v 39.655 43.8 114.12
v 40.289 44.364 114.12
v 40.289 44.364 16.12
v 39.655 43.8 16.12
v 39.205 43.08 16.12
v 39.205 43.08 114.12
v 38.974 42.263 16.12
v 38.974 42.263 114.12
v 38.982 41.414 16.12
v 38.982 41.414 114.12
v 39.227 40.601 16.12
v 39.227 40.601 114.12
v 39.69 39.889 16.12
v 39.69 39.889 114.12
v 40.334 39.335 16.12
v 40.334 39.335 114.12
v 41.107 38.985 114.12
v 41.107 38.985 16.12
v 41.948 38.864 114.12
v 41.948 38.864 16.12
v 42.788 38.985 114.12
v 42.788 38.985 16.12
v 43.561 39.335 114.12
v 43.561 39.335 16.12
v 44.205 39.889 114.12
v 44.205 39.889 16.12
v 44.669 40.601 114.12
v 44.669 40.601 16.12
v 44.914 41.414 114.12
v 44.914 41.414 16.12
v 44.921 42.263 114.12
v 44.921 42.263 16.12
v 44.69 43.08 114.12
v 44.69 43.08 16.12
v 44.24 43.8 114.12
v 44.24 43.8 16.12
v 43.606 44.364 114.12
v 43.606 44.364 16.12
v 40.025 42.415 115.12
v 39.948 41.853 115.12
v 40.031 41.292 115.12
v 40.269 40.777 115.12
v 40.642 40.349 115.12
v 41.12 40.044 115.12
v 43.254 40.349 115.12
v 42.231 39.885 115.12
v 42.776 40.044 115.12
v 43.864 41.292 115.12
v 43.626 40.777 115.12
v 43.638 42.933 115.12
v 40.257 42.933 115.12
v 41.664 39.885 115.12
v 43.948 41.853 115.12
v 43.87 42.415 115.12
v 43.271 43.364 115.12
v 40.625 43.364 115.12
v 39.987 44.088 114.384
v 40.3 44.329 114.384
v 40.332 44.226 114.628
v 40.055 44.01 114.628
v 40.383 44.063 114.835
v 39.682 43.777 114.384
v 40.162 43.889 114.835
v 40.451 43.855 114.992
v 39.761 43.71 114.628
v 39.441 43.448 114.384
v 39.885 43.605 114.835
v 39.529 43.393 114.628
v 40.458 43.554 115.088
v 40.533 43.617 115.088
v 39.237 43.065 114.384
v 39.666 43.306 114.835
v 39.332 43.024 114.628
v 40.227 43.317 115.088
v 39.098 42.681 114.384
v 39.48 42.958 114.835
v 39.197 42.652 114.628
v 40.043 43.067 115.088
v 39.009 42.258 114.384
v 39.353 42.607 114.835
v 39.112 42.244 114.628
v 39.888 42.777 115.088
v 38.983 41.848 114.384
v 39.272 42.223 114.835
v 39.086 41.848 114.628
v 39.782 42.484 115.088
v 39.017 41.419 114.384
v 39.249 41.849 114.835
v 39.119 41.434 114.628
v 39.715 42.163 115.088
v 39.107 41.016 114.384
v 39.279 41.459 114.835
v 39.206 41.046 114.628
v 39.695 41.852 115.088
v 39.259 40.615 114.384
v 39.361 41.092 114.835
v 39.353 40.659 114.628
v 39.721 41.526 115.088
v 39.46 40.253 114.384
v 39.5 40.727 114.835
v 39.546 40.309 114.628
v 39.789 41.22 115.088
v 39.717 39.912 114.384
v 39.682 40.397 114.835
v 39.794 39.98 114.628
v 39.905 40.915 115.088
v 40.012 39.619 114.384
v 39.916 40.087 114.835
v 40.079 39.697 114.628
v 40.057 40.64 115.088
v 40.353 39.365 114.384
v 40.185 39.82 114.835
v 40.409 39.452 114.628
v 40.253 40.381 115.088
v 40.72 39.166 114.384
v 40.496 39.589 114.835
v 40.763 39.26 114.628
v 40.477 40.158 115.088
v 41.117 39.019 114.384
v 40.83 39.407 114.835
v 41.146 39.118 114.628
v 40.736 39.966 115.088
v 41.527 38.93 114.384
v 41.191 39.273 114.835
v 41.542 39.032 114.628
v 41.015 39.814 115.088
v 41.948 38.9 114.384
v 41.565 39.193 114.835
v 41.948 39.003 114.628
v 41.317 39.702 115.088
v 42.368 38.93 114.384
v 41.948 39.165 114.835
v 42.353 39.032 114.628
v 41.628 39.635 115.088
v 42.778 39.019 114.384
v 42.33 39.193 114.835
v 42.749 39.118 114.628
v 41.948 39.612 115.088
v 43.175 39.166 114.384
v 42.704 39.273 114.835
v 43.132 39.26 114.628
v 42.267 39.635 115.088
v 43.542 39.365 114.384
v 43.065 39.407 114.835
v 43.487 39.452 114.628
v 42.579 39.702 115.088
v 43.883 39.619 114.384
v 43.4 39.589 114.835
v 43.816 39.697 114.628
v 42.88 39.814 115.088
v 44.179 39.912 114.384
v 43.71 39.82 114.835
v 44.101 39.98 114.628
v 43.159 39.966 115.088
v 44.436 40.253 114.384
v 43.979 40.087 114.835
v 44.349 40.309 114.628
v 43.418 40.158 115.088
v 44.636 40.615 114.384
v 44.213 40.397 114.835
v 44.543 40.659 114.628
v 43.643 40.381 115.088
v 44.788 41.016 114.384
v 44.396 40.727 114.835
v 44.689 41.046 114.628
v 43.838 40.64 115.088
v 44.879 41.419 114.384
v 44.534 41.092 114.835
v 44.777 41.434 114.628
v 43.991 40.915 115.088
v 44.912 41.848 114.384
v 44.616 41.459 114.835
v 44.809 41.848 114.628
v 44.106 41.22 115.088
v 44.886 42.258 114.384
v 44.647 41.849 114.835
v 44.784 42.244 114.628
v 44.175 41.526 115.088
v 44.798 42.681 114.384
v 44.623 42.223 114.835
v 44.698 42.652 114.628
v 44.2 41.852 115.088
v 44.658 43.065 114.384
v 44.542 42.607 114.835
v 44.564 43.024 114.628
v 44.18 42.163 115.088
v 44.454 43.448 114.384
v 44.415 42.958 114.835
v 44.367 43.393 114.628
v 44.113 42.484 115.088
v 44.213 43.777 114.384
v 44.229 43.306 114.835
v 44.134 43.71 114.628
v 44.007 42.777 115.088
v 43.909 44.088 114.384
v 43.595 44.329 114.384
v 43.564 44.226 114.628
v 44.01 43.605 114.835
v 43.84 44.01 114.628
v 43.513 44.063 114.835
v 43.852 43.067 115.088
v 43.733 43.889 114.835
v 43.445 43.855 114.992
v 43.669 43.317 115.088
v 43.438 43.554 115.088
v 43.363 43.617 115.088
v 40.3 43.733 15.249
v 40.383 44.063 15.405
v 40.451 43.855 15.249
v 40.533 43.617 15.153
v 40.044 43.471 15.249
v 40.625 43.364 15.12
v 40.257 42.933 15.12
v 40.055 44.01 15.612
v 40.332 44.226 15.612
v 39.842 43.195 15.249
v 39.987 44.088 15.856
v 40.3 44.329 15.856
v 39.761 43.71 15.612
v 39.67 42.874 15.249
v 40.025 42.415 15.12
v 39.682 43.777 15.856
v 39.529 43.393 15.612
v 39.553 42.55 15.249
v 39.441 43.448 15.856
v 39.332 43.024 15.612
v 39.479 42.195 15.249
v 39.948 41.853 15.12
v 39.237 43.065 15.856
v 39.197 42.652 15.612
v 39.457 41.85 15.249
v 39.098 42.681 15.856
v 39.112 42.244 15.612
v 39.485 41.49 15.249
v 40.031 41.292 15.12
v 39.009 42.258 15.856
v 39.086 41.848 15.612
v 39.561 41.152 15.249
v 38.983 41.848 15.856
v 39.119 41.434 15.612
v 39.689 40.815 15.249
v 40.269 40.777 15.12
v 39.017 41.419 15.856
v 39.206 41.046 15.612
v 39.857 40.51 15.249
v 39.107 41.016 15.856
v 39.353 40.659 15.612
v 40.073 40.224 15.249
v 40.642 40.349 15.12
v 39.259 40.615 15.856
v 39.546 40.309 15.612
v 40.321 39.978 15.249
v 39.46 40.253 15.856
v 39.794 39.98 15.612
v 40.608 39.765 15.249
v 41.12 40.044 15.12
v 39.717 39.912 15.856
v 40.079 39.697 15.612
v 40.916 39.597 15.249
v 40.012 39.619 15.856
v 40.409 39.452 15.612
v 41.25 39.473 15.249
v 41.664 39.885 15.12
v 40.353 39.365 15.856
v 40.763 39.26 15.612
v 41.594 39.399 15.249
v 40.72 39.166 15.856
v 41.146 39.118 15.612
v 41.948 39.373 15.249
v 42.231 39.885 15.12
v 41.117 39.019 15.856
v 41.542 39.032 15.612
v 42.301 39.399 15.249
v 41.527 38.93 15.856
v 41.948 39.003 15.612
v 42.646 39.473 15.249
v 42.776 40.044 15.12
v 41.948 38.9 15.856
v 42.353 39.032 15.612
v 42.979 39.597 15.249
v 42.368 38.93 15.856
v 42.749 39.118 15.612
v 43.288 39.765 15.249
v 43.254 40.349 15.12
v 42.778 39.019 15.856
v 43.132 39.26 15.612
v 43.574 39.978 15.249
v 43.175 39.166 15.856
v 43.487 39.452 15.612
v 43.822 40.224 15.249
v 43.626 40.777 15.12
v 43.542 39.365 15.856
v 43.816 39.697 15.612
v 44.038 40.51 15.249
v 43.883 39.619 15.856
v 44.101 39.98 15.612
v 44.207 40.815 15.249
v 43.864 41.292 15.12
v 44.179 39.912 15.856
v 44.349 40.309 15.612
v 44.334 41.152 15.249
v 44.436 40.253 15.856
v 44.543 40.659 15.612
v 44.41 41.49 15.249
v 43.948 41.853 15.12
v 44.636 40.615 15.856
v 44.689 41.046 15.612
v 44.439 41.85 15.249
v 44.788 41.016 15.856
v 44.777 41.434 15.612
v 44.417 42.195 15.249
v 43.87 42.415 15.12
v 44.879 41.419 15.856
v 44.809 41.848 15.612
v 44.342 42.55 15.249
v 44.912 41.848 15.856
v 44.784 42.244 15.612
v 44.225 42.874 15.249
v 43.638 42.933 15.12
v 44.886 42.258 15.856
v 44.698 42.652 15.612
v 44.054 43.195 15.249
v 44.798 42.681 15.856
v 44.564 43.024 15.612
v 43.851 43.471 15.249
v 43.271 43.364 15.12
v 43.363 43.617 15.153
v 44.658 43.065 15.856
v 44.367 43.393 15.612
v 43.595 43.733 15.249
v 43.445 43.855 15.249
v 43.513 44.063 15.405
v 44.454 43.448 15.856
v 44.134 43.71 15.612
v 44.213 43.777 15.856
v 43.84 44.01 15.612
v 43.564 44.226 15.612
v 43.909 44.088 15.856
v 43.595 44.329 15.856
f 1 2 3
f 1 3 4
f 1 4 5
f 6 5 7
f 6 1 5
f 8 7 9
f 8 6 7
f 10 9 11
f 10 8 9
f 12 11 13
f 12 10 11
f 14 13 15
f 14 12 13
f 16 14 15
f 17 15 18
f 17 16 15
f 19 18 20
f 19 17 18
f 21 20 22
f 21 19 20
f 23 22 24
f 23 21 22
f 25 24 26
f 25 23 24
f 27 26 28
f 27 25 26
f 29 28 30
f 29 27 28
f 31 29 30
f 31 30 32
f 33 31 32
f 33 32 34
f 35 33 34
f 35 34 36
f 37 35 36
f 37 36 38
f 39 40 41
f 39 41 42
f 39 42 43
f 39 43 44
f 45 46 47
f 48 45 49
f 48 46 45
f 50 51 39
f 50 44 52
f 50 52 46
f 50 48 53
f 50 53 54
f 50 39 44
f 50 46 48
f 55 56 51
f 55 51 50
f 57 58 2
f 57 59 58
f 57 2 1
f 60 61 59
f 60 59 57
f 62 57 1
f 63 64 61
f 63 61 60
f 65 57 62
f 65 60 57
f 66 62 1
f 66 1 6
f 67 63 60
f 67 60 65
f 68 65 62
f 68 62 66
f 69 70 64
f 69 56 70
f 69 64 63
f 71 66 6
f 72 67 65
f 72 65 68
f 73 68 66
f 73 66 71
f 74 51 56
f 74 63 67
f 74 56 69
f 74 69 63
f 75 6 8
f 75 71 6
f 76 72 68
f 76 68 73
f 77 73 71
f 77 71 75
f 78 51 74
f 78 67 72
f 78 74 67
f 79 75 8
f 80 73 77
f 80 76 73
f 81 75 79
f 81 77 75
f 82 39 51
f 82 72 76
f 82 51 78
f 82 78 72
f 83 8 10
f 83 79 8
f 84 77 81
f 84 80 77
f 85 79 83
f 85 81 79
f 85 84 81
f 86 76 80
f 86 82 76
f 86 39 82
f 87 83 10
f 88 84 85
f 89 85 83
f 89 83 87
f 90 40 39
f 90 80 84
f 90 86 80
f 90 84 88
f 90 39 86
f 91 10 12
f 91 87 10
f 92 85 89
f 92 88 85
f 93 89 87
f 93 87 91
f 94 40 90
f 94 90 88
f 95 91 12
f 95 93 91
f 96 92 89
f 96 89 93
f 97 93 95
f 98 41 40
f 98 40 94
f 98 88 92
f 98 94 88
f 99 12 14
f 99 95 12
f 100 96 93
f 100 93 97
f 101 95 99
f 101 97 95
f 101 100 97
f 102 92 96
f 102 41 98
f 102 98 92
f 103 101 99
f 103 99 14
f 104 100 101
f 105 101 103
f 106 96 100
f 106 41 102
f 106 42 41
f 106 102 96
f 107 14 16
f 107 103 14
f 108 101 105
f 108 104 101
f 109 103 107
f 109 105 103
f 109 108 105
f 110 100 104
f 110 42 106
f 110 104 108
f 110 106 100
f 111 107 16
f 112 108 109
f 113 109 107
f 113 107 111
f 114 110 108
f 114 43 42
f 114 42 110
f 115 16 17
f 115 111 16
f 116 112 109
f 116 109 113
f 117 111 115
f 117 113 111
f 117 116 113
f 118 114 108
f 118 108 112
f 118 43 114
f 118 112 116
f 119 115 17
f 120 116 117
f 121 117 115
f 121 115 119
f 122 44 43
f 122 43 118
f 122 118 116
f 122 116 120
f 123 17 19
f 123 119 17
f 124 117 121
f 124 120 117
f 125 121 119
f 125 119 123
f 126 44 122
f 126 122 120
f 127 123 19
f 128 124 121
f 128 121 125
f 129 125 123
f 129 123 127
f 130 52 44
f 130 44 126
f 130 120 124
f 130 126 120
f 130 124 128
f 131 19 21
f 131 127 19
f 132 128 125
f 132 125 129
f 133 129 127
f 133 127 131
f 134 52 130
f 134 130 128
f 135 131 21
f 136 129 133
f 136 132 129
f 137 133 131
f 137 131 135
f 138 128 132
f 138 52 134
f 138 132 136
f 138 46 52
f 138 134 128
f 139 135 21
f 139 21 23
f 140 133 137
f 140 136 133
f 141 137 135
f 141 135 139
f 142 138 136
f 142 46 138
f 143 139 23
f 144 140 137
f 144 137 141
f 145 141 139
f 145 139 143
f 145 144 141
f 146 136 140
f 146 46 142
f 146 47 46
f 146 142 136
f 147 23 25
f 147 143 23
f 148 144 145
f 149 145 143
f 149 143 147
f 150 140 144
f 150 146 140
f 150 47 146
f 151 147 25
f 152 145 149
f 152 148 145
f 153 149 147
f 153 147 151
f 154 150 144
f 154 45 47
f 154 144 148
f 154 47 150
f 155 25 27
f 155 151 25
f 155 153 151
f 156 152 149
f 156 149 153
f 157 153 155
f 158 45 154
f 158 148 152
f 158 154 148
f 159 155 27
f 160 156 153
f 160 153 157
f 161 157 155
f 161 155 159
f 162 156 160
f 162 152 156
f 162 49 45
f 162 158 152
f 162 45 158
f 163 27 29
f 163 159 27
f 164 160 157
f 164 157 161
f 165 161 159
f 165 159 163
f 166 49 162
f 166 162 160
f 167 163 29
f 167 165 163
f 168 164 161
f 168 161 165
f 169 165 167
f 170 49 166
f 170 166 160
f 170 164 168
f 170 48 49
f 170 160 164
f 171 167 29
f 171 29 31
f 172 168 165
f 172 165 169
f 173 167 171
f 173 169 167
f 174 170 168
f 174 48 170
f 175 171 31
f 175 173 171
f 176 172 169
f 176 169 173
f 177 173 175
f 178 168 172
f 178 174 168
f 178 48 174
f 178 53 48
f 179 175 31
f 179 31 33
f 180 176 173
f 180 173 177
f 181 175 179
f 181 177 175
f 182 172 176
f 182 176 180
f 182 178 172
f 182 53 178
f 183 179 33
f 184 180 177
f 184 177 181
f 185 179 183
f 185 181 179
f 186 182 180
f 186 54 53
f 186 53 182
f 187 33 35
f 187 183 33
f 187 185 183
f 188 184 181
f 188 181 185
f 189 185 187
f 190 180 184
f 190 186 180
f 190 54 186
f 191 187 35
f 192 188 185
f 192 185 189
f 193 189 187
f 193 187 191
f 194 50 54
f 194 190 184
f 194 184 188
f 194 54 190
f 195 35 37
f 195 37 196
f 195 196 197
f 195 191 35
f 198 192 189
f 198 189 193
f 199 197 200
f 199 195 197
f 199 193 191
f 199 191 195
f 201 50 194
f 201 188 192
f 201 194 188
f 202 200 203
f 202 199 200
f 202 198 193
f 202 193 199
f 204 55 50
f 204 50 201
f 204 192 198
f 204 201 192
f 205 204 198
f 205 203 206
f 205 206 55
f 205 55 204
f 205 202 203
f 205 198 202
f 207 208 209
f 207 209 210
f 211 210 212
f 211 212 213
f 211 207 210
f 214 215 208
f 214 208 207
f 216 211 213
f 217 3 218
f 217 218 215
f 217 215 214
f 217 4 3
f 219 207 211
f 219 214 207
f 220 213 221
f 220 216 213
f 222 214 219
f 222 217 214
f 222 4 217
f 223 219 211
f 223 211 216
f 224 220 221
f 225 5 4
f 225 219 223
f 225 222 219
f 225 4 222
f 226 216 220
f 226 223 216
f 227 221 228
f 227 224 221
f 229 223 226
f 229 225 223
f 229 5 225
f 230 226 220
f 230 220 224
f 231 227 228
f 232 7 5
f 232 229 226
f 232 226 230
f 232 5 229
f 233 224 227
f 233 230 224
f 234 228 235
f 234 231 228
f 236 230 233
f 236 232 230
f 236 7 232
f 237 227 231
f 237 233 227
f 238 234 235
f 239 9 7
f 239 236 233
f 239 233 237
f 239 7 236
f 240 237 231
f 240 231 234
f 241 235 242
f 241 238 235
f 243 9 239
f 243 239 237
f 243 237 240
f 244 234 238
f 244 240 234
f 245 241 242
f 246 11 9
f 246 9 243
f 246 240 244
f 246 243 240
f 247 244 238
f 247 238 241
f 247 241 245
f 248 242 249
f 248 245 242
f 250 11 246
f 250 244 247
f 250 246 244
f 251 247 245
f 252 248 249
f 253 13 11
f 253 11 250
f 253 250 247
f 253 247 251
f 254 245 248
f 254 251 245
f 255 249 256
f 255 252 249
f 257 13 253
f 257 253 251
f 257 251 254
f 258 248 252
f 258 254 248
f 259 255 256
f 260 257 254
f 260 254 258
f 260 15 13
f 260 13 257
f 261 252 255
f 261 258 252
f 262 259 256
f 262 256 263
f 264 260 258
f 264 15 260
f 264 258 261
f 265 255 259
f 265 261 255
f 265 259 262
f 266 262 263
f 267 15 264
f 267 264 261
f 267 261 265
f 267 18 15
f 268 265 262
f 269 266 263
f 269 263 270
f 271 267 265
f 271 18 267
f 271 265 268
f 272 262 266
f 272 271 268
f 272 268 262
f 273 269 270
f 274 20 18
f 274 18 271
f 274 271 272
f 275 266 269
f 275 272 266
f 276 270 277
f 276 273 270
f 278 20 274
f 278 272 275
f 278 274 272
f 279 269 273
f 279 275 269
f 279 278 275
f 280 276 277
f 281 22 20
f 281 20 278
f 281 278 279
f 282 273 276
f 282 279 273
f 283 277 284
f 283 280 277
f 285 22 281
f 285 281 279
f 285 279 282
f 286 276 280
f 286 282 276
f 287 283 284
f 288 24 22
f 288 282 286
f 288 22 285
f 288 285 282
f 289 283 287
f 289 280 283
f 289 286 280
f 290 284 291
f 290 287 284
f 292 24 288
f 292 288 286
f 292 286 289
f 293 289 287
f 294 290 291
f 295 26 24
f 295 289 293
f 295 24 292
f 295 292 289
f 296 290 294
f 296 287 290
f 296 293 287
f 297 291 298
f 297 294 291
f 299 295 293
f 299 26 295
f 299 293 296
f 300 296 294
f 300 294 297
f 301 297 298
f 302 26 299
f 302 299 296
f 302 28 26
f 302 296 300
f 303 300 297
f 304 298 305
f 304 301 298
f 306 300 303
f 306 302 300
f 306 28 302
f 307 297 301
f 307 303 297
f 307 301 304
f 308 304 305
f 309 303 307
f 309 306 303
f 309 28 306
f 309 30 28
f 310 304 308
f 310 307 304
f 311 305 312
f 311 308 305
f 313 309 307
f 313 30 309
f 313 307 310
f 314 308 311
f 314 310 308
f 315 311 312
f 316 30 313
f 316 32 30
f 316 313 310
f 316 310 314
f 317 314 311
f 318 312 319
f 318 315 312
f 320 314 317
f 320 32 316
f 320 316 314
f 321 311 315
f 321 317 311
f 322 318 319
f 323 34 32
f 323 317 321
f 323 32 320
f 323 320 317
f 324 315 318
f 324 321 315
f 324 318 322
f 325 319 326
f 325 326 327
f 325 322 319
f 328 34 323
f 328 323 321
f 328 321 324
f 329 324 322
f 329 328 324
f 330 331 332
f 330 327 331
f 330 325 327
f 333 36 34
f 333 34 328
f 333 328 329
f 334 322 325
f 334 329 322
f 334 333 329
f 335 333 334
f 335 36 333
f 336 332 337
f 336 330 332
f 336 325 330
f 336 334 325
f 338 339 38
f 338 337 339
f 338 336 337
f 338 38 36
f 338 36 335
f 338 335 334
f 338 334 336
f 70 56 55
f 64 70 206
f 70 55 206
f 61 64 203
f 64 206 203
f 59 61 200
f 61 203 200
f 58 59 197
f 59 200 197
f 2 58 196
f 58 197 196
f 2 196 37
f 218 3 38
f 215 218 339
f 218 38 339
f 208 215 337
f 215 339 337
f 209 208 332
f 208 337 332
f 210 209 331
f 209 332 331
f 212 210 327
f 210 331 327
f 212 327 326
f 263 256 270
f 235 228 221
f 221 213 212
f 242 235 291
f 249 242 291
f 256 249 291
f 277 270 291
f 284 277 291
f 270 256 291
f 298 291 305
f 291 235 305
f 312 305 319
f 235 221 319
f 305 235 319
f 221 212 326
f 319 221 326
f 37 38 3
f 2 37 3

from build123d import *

# Parameters (mm, degrees)
BOSS_EXTRUDE1_DEPTH = 100
FILLET1_R           = 1


with BuildPart() as part:
    # Sketch1 → Boss-Extrude1 (new body)
    with BuildSketch(Plane.XY.offset(115.120373728)):
        with BuildLine():
            Line((43.606003854, 44.364343494), (40.289379064, 44.364343494))
            ThreePointArc((40.289379064, 44.364343494), (41.947691459, 38.864343494), (43.606003854, 44.364343494))
        make_face()
    extrude(amount=-BOSS_EXTRUDE1_DEPTH)

    # Fillet1
    # the kernel refuses this fillet: 1 mm, written as the material it takes off along each edge
    with BuildSketch(Plane(origin=(46.106003854, 44.364343494, 115.120373728), x_dir=(0, 0, -1), z_dir=(-1, 0, 0))) as fillet1_piece_1:
        with BuildLine():
            CenterArc((FILLET1_R, FILLET1_R), FILLET1_R, 180, 90)
            Line((0, FILLET1_R), (0, 0))
            Line((0, 0), (FILLET1_R, 0))
        make_face()
    extrude(amount=8.31662479, mode=Mode.SUBTRACT)
    with BuildSketch(Plane(origin=(41.947691459, 41.864343494, 115.120373728), x_dir=(-0.0031415874858803736, 0.9999950652018582, 0), z_dir=(0.9999950652018582, 0.0031415874858803736, 0))) as fillet1_piece_2:
        with BuildLine():
            CenterArc((3 - FILLET1_R, -FILLET1_R), FILLET1_R, 0, 90)
            Line((3 - FILLET1_R, 0), (3, 0))
            Line((3, 0), (3, -FILLET1_R))
        make_face()
    revolve(axis=Axis((41.947691459, 41.864343494, 115.120373728), (0, 0, 1)), revolution_arc=359.64, mode=Mode.SUBTRACT)
    with BuildSketch(Plane(origin=(41.947691459, 41.864343494, 15.120373728), x_dir=(-0.0031415874858803736, 0.9999950652018582, 0), z_dir=(0.9999950652018582, 0.0031415874858803736, 0))) as fillet1_piece_3:
        with BuildLine():
            CenterArc((3 - FILLET1_R, FILLET1_R), FILLET1_R, 270, 90)
            Line((3 - FILLET1_R, 0), (3, 0))
            Line((3, 0), (3, FILLET1_R))
        make_face()
    revolve(axis=Axis((41.947691459, 41.864343494, 15.120373728), (0, 0, 1)), revolution_arc=359.64, mode=Mode.SUBTRACT)
    with BuildSketch(Plane(origin=(46.106003854, 44.364343494, 15.120373728), x_dir=(0, 0, 1), z_dir=(-1, 0, 0))) as fillet1_piece_4:
        with BuildLine():
            CenterArc((FILLET1_R, -FILLET1_R), FILLET1_R, 90, 90)
            Line((0, -FILLET1_R), (0, 0))
            Line((0, 0), (FILLET1_R, 0))
        make_face()
    extrude(amount=8.31662479, mode=Mode.SUBTRACT)


solid = part.part
